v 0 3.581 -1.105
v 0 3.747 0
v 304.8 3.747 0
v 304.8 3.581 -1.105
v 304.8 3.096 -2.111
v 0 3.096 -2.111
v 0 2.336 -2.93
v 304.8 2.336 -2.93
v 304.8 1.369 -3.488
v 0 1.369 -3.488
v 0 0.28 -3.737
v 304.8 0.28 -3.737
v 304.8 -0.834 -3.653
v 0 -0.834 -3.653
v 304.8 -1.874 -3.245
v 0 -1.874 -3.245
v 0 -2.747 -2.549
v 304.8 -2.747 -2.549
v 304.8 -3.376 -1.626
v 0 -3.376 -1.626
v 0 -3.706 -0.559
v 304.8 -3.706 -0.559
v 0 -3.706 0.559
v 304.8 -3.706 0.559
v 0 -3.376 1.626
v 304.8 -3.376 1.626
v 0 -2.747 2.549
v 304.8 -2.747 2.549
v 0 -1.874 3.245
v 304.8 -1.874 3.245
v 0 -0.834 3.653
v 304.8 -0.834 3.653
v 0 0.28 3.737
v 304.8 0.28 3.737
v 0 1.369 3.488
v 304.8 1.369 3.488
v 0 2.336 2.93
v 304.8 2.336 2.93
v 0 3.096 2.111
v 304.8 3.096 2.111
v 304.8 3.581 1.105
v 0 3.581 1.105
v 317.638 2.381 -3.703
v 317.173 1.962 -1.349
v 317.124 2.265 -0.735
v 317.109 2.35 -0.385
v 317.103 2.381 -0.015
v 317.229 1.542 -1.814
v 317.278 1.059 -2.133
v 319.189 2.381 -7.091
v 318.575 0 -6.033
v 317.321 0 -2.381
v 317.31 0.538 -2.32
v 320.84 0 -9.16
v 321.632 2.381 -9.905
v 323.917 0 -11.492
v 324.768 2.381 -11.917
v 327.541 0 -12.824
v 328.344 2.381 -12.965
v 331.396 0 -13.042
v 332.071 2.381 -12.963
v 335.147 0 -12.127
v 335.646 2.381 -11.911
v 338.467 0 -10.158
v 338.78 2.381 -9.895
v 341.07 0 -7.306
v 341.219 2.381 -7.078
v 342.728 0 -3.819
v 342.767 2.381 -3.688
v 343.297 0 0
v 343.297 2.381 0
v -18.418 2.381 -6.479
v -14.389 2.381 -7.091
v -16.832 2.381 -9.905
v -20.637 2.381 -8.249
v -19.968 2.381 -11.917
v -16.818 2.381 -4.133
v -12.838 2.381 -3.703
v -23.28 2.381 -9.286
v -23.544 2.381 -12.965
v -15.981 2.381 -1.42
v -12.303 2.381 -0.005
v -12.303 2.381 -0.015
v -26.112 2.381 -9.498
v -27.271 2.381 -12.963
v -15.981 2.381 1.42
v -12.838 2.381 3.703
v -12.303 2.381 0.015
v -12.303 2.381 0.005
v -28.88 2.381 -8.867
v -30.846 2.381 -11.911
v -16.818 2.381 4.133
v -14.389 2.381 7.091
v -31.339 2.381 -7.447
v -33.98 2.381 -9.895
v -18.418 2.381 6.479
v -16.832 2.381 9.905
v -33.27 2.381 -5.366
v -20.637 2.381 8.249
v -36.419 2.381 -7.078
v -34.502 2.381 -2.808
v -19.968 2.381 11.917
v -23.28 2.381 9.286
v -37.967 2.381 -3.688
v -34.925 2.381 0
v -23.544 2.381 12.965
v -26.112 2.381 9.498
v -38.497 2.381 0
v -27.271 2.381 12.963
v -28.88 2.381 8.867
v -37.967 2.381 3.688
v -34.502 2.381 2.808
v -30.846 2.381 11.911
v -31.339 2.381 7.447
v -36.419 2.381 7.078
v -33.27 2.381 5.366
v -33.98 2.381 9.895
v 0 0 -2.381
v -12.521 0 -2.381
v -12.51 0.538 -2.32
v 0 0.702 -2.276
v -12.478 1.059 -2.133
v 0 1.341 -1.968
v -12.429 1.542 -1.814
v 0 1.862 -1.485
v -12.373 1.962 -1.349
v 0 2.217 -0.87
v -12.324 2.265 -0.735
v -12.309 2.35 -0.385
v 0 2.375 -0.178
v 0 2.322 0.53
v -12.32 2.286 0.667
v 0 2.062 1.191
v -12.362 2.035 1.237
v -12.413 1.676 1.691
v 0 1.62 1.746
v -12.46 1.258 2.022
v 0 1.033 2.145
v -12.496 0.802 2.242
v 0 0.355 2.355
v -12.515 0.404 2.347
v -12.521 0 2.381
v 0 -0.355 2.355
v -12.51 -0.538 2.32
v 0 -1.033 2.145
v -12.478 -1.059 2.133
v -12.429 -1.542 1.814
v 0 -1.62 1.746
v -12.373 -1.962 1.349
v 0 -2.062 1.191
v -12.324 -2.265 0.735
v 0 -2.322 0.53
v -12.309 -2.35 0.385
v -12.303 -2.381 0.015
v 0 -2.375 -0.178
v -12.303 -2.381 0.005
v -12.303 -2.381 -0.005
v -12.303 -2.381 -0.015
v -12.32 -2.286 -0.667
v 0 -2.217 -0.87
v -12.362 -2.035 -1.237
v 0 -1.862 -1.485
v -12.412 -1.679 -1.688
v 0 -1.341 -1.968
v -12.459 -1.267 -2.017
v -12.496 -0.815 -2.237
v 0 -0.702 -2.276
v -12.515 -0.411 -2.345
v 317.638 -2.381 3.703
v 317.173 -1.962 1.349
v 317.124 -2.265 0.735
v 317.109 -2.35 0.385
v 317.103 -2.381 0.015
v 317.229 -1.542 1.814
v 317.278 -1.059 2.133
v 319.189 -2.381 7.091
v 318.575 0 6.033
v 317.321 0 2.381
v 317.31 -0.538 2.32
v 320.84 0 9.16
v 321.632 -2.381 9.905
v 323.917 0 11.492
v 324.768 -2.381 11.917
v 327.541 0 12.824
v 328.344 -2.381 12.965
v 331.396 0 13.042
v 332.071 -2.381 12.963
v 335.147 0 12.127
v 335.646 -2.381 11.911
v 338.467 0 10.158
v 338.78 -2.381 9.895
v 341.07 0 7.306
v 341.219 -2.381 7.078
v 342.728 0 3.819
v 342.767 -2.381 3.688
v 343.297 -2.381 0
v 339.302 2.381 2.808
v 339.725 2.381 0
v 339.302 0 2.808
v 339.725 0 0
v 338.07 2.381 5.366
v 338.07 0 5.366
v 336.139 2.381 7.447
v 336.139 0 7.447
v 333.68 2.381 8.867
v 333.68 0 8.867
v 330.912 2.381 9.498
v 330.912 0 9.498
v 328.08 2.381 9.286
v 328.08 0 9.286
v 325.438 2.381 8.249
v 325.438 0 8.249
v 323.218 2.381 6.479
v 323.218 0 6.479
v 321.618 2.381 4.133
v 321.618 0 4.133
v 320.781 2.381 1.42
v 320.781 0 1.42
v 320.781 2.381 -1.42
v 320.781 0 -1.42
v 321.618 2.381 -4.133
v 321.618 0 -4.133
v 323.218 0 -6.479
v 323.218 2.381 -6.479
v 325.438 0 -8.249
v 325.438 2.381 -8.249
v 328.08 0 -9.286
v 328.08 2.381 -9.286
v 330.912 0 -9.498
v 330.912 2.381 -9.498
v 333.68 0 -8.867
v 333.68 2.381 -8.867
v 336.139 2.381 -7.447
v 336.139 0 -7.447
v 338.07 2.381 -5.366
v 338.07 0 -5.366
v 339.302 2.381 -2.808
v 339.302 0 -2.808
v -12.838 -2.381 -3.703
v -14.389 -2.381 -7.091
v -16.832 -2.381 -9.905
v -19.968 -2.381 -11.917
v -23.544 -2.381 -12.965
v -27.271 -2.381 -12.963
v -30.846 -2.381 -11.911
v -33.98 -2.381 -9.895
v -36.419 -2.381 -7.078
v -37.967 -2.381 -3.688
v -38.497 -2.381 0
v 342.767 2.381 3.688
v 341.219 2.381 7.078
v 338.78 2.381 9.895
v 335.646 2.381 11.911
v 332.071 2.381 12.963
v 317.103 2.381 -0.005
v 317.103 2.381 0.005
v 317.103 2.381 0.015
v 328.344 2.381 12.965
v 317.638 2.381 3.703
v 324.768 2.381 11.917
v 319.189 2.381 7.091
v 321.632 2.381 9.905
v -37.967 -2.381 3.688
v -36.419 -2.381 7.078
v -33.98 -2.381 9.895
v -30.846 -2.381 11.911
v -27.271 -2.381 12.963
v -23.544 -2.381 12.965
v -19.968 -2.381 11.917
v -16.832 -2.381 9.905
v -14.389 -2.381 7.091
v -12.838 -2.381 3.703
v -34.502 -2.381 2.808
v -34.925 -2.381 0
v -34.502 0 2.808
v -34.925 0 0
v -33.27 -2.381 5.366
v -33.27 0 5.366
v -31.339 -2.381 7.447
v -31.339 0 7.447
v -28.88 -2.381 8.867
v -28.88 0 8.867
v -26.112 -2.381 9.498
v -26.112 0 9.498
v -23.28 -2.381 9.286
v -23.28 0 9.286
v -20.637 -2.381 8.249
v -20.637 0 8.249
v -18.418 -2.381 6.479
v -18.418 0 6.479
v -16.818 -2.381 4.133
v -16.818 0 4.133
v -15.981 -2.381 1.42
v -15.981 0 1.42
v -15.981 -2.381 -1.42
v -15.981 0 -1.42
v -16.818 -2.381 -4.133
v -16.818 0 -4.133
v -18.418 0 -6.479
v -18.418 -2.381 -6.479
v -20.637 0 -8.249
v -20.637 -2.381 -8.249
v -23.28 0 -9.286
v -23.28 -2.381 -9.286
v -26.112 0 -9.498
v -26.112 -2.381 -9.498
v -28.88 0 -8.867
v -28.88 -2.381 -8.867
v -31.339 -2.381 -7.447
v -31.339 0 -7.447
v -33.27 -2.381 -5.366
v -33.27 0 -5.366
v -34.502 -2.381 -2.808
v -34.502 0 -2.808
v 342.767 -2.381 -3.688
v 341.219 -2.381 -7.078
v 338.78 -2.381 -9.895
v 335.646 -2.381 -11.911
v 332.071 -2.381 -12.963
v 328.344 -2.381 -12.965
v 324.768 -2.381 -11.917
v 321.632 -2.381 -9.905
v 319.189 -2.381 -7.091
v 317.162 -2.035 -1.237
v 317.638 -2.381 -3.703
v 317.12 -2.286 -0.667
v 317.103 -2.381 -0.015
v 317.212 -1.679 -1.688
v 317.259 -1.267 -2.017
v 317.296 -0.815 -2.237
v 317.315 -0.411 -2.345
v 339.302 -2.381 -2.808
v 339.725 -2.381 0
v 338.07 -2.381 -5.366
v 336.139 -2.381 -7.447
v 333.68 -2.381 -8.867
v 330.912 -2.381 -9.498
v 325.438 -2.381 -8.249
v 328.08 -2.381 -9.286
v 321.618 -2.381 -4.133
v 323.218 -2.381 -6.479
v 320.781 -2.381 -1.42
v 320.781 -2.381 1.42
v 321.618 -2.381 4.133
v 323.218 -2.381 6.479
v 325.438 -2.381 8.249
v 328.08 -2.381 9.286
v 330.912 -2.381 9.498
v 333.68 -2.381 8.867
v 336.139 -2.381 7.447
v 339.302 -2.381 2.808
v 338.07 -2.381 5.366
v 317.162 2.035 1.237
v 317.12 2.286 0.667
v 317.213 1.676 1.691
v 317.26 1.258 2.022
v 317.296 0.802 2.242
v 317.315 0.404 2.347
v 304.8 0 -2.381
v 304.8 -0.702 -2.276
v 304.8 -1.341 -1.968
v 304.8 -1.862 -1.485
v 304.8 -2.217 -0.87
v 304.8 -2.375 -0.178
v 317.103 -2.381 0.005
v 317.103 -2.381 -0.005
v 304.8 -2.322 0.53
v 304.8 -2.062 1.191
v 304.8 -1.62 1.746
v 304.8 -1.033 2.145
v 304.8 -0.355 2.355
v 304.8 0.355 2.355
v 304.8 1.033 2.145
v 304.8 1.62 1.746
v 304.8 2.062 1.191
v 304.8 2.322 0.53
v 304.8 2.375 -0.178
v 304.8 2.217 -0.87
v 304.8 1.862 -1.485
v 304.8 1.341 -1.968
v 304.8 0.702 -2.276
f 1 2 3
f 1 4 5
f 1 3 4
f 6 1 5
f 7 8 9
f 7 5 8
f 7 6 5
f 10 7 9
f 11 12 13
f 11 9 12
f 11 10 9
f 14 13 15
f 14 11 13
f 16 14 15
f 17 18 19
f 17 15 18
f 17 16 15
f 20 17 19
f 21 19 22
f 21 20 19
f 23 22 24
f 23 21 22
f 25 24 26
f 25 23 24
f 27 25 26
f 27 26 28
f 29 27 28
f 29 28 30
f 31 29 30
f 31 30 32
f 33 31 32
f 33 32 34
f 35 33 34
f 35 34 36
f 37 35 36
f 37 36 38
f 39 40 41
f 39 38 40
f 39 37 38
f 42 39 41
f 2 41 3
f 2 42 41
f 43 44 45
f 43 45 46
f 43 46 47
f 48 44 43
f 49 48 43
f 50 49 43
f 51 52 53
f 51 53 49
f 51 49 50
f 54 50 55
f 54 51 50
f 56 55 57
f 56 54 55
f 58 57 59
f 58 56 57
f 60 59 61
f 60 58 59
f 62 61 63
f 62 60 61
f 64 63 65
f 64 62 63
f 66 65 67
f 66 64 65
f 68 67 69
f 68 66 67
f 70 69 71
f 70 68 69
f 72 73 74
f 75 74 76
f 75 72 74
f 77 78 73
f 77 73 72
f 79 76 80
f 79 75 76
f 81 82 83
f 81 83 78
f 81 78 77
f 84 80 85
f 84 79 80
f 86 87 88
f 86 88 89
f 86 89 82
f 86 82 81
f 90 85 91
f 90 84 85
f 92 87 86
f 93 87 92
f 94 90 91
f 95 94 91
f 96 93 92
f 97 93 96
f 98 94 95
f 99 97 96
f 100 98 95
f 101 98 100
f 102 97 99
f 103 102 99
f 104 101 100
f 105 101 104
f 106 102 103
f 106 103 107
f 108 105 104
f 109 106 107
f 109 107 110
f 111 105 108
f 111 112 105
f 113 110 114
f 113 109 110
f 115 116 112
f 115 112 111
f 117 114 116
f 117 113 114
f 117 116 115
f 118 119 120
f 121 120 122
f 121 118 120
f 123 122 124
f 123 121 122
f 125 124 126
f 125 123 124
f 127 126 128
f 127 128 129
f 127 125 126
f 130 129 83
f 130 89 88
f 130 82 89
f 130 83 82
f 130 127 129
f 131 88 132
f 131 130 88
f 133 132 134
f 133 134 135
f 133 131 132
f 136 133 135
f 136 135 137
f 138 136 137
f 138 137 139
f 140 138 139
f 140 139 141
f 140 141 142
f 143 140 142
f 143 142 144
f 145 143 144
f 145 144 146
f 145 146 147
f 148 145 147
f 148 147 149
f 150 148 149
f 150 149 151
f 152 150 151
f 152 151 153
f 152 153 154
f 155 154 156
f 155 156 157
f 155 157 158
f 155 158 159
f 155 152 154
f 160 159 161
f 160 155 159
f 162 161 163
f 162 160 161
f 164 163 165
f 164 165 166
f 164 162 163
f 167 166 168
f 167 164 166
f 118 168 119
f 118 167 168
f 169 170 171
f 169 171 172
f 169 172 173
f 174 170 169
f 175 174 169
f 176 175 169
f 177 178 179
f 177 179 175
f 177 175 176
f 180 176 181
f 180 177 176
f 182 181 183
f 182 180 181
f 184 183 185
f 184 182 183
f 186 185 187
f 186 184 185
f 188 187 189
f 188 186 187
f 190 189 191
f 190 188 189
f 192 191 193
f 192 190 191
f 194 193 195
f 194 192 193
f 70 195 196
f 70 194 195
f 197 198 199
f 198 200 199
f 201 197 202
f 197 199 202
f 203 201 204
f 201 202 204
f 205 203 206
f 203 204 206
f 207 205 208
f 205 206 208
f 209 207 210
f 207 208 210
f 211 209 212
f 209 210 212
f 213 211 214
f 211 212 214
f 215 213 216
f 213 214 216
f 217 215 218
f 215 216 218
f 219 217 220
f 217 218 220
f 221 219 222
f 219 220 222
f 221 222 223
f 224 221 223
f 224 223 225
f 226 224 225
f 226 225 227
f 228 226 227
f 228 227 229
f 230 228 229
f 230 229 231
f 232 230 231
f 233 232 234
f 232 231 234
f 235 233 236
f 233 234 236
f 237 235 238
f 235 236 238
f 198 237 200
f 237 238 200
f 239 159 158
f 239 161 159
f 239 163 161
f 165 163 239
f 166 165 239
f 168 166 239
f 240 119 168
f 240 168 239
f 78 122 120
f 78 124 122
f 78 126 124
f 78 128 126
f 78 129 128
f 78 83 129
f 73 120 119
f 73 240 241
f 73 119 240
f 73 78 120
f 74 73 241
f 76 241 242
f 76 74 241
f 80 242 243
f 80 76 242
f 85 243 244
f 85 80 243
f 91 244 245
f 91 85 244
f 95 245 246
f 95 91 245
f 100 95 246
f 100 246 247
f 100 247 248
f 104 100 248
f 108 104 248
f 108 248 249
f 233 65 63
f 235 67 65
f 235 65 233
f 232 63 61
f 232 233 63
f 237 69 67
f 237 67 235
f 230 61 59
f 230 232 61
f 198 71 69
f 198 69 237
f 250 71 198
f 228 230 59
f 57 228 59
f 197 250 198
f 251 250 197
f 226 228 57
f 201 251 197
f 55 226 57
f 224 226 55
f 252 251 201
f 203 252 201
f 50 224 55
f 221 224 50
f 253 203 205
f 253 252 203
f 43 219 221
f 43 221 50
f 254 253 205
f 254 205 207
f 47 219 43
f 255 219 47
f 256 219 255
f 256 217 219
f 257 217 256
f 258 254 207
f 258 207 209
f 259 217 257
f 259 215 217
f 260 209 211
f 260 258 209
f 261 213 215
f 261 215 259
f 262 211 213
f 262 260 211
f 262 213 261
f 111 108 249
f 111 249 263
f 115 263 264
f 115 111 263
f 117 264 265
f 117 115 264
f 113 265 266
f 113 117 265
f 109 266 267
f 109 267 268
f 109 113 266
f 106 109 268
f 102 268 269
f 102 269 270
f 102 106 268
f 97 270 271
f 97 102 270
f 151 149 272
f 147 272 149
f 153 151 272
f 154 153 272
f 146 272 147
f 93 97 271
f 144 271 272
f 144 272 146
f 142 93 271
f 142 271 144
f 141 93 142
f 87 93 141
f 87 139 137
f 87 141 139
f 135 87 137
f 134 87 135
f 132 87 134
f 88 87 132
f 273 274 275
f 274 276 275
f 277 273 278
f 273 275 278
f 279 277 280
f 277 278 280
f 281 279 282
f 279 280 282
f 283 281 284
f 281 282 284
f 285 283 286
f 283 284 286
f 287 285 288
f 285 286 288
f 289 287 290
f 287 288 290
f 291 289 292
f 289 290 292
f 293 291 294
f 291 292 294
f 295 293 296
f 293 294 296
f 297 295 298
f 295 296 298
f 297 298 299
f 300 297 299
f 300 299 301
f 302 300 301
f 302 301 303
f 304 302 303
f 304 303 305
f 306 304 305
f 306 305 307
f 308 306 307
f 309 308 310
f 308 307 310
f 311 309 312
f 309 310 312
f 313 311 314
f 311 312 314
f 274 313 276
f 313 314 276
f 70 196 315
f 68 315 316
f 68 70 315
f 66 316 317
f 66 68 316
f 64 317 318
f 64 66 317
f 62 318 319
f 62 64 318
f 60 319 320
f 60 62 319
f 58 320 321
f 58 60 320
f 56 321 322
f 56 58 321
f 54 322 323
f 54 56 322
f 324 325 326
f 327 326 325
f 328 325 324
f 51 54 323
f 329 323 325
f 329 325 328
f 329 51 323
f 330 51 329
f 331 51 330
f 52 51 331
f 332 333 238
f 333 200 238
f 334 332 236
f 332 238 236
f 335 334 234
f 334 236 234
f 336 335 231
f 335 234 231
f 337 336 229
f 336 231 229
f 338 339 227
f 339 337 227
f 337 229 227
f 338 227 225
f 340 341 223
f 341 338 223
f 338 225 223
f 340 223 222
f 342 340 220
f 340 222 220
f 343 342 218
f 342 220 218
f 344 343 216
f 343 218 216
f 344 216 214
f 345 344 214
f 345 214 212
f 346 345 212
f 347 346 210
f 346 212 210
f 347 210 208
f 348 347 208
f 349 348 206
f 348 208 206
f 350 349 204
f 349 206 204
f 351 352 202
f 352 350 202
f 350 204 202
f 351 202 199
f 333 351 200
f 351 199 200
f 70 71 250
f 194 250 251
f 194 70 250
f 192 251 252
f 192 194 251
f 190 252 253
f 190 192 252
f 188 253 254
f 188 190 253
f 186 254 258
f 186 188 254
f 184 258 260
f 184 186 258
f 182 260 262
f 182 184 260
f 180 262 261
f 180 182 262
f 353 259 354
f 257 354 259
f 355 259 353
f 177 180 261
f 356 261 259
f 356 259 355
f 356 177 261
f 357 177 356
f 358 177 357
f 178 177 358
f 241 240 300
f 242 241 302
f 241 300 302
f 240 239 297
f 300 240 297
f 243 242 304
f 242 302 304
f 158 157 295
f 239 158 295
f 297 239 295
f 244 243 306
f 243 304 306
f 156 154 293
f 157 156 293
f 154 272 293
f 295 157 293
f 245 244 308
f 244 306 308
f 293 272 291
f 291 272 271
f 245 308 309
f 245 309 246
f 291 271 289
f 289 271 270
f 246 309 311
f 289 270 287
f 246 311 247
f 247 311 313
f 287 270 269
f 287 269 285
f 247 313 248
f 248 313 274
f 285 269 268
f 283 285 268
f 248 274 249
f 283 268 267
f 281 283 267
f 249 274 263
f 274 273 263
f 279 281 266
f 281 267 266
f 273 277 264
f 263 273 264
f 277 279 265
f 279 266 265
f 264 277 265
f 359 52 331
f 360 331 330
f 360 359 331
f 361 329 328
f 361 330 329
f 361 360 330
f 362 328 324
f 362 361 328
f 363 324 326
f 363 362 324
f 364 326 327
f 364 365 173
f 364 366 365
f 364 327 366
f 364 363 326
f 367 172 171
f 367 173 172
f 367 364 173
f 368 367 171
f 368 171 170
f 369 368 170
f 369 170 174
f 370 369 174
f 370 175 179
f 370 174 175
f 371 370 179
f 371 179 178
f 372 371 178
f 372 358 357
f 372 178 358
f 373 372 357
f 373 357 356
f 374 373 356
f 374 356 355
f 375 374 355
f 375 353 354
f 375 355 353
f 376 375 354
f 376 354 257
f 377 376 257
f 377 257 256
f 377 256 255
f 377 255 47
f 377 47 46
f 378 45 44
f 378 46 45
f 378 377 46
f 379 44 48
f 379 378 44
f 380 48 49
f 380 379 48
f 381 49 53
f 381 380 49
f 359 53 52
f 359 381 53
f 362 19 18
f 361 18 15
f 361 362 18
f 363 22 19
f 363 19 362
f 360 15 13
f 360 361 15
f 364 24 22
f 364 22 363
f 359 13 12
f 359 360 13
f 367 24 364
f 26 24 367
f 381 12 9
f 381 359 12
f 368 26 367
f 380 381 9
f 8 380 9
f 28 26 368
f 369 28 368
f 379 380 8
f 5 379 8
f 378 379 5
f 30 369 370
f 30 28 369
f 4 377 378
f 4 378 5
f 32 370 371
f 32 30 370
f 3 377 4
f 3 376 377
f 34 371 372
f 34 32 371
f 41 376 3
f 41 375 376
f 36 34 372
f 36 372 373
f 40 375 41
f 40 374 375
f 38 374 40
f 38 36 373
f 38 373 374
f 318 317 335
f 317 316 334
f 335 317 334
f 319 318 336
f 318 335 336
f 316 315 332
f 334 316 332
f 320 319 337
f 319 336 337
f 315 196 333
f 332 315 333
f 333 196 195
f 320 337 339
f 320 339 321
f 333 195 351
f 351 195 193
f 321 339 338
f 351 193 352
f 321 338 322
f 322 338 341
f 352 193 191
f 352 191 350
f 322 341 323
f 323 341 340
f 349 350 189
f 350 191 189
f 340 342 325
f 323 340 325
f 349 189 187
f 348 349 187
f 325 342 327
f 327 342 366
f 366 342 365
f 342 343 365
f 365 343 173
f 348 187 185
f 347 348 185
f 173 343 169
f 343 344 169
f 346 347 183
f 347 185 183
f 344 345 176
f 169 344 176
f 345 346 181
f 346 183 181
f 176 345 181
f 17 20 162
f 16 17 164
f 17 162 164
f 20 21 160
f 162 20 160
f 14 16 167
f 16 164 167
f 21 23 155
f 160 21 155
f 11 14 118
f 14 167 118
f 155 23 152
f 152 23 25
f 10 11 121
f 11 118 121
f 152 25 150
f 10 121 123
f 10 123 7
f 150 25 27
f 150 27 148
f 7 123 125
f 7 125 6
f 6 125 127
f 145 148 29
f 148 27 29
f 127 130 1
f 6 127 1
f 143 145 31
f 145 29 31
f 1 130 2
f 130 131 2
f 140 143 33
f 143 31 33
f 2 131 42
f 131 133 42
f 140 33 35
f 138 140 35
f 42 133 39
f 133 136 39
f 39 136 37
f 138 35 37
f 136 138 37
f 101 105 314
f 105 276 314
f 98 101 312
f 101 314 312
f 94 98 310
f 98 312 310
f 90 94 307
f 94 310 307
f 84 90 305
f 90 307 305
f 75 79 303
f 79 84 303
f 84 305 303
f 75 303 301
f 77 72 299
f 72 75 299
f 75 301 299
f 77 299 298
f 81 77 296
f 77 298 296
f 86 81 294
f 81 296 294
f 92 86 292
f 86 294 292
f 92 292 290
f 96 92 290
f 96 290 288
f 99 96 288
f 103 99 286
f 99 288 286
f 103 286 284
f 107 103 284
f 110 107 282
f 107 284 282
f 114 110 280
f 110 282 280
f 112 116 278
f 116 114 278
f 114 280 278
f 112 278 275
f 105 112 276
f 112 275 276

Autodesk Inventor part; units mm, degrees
ref_plane "YZ Plane" through (0, 0, 0) normal (1, 0, 0) x (0, 1, 0)
sketch "Sketch1" plane through (0, 0, 0) normal (1, 0, 0) x (0, 1, 0)
  circle A0 centre (0, 0) radius 3.7474
extrude "Black Shaft" add sketch "Sketch1" along normal blind 304.8
sketch "Sketch3" plane through (304.8, 0, 0) normal (1, 0, 0) x (0, 0, -1)
  circle A0 centre (0, 0) radius 2.3813
  dimension "d2" = 4.7625
extrude "Screwed Shaft" add sketch "Sketch3" along normal blind 12.7 and the other way blind 317.5
ref_plane "Mid Plane" through (152.4, 0, 0) normal (1, 0, 0) x (0, 0, -1)
sketch "Sketch4" plane through (0, 0, 0) normal (0, 1, 0) x (-1, 0, 0)
  circle A0 centre (25.4, 0) radius 13.0969
  line L0 (12.7, -2.3813) -> (12.7, 2.3813) construction
  circle A1 centre (25.4, 0) radius 9.525
  point P0 (0, 0)
  dimension "d7" = 26.1938
  dimension "d8" = 12.7
  dimension "d9" = 19.05
extrude "Rod End1" add sketch "Sketch4" along normal mid plane 4.7625
mirror "Rod End2" about plane through (152.4, 0, 0) normal (1, 0, 0) of "Rod End1"
ref_plane "Horizontal Midplane" through (-25.4, 0, 0) normal (0, 1, 0) x (1, 0, 0)
properties part number "Tie Rods" material "Aluminum 6061"
